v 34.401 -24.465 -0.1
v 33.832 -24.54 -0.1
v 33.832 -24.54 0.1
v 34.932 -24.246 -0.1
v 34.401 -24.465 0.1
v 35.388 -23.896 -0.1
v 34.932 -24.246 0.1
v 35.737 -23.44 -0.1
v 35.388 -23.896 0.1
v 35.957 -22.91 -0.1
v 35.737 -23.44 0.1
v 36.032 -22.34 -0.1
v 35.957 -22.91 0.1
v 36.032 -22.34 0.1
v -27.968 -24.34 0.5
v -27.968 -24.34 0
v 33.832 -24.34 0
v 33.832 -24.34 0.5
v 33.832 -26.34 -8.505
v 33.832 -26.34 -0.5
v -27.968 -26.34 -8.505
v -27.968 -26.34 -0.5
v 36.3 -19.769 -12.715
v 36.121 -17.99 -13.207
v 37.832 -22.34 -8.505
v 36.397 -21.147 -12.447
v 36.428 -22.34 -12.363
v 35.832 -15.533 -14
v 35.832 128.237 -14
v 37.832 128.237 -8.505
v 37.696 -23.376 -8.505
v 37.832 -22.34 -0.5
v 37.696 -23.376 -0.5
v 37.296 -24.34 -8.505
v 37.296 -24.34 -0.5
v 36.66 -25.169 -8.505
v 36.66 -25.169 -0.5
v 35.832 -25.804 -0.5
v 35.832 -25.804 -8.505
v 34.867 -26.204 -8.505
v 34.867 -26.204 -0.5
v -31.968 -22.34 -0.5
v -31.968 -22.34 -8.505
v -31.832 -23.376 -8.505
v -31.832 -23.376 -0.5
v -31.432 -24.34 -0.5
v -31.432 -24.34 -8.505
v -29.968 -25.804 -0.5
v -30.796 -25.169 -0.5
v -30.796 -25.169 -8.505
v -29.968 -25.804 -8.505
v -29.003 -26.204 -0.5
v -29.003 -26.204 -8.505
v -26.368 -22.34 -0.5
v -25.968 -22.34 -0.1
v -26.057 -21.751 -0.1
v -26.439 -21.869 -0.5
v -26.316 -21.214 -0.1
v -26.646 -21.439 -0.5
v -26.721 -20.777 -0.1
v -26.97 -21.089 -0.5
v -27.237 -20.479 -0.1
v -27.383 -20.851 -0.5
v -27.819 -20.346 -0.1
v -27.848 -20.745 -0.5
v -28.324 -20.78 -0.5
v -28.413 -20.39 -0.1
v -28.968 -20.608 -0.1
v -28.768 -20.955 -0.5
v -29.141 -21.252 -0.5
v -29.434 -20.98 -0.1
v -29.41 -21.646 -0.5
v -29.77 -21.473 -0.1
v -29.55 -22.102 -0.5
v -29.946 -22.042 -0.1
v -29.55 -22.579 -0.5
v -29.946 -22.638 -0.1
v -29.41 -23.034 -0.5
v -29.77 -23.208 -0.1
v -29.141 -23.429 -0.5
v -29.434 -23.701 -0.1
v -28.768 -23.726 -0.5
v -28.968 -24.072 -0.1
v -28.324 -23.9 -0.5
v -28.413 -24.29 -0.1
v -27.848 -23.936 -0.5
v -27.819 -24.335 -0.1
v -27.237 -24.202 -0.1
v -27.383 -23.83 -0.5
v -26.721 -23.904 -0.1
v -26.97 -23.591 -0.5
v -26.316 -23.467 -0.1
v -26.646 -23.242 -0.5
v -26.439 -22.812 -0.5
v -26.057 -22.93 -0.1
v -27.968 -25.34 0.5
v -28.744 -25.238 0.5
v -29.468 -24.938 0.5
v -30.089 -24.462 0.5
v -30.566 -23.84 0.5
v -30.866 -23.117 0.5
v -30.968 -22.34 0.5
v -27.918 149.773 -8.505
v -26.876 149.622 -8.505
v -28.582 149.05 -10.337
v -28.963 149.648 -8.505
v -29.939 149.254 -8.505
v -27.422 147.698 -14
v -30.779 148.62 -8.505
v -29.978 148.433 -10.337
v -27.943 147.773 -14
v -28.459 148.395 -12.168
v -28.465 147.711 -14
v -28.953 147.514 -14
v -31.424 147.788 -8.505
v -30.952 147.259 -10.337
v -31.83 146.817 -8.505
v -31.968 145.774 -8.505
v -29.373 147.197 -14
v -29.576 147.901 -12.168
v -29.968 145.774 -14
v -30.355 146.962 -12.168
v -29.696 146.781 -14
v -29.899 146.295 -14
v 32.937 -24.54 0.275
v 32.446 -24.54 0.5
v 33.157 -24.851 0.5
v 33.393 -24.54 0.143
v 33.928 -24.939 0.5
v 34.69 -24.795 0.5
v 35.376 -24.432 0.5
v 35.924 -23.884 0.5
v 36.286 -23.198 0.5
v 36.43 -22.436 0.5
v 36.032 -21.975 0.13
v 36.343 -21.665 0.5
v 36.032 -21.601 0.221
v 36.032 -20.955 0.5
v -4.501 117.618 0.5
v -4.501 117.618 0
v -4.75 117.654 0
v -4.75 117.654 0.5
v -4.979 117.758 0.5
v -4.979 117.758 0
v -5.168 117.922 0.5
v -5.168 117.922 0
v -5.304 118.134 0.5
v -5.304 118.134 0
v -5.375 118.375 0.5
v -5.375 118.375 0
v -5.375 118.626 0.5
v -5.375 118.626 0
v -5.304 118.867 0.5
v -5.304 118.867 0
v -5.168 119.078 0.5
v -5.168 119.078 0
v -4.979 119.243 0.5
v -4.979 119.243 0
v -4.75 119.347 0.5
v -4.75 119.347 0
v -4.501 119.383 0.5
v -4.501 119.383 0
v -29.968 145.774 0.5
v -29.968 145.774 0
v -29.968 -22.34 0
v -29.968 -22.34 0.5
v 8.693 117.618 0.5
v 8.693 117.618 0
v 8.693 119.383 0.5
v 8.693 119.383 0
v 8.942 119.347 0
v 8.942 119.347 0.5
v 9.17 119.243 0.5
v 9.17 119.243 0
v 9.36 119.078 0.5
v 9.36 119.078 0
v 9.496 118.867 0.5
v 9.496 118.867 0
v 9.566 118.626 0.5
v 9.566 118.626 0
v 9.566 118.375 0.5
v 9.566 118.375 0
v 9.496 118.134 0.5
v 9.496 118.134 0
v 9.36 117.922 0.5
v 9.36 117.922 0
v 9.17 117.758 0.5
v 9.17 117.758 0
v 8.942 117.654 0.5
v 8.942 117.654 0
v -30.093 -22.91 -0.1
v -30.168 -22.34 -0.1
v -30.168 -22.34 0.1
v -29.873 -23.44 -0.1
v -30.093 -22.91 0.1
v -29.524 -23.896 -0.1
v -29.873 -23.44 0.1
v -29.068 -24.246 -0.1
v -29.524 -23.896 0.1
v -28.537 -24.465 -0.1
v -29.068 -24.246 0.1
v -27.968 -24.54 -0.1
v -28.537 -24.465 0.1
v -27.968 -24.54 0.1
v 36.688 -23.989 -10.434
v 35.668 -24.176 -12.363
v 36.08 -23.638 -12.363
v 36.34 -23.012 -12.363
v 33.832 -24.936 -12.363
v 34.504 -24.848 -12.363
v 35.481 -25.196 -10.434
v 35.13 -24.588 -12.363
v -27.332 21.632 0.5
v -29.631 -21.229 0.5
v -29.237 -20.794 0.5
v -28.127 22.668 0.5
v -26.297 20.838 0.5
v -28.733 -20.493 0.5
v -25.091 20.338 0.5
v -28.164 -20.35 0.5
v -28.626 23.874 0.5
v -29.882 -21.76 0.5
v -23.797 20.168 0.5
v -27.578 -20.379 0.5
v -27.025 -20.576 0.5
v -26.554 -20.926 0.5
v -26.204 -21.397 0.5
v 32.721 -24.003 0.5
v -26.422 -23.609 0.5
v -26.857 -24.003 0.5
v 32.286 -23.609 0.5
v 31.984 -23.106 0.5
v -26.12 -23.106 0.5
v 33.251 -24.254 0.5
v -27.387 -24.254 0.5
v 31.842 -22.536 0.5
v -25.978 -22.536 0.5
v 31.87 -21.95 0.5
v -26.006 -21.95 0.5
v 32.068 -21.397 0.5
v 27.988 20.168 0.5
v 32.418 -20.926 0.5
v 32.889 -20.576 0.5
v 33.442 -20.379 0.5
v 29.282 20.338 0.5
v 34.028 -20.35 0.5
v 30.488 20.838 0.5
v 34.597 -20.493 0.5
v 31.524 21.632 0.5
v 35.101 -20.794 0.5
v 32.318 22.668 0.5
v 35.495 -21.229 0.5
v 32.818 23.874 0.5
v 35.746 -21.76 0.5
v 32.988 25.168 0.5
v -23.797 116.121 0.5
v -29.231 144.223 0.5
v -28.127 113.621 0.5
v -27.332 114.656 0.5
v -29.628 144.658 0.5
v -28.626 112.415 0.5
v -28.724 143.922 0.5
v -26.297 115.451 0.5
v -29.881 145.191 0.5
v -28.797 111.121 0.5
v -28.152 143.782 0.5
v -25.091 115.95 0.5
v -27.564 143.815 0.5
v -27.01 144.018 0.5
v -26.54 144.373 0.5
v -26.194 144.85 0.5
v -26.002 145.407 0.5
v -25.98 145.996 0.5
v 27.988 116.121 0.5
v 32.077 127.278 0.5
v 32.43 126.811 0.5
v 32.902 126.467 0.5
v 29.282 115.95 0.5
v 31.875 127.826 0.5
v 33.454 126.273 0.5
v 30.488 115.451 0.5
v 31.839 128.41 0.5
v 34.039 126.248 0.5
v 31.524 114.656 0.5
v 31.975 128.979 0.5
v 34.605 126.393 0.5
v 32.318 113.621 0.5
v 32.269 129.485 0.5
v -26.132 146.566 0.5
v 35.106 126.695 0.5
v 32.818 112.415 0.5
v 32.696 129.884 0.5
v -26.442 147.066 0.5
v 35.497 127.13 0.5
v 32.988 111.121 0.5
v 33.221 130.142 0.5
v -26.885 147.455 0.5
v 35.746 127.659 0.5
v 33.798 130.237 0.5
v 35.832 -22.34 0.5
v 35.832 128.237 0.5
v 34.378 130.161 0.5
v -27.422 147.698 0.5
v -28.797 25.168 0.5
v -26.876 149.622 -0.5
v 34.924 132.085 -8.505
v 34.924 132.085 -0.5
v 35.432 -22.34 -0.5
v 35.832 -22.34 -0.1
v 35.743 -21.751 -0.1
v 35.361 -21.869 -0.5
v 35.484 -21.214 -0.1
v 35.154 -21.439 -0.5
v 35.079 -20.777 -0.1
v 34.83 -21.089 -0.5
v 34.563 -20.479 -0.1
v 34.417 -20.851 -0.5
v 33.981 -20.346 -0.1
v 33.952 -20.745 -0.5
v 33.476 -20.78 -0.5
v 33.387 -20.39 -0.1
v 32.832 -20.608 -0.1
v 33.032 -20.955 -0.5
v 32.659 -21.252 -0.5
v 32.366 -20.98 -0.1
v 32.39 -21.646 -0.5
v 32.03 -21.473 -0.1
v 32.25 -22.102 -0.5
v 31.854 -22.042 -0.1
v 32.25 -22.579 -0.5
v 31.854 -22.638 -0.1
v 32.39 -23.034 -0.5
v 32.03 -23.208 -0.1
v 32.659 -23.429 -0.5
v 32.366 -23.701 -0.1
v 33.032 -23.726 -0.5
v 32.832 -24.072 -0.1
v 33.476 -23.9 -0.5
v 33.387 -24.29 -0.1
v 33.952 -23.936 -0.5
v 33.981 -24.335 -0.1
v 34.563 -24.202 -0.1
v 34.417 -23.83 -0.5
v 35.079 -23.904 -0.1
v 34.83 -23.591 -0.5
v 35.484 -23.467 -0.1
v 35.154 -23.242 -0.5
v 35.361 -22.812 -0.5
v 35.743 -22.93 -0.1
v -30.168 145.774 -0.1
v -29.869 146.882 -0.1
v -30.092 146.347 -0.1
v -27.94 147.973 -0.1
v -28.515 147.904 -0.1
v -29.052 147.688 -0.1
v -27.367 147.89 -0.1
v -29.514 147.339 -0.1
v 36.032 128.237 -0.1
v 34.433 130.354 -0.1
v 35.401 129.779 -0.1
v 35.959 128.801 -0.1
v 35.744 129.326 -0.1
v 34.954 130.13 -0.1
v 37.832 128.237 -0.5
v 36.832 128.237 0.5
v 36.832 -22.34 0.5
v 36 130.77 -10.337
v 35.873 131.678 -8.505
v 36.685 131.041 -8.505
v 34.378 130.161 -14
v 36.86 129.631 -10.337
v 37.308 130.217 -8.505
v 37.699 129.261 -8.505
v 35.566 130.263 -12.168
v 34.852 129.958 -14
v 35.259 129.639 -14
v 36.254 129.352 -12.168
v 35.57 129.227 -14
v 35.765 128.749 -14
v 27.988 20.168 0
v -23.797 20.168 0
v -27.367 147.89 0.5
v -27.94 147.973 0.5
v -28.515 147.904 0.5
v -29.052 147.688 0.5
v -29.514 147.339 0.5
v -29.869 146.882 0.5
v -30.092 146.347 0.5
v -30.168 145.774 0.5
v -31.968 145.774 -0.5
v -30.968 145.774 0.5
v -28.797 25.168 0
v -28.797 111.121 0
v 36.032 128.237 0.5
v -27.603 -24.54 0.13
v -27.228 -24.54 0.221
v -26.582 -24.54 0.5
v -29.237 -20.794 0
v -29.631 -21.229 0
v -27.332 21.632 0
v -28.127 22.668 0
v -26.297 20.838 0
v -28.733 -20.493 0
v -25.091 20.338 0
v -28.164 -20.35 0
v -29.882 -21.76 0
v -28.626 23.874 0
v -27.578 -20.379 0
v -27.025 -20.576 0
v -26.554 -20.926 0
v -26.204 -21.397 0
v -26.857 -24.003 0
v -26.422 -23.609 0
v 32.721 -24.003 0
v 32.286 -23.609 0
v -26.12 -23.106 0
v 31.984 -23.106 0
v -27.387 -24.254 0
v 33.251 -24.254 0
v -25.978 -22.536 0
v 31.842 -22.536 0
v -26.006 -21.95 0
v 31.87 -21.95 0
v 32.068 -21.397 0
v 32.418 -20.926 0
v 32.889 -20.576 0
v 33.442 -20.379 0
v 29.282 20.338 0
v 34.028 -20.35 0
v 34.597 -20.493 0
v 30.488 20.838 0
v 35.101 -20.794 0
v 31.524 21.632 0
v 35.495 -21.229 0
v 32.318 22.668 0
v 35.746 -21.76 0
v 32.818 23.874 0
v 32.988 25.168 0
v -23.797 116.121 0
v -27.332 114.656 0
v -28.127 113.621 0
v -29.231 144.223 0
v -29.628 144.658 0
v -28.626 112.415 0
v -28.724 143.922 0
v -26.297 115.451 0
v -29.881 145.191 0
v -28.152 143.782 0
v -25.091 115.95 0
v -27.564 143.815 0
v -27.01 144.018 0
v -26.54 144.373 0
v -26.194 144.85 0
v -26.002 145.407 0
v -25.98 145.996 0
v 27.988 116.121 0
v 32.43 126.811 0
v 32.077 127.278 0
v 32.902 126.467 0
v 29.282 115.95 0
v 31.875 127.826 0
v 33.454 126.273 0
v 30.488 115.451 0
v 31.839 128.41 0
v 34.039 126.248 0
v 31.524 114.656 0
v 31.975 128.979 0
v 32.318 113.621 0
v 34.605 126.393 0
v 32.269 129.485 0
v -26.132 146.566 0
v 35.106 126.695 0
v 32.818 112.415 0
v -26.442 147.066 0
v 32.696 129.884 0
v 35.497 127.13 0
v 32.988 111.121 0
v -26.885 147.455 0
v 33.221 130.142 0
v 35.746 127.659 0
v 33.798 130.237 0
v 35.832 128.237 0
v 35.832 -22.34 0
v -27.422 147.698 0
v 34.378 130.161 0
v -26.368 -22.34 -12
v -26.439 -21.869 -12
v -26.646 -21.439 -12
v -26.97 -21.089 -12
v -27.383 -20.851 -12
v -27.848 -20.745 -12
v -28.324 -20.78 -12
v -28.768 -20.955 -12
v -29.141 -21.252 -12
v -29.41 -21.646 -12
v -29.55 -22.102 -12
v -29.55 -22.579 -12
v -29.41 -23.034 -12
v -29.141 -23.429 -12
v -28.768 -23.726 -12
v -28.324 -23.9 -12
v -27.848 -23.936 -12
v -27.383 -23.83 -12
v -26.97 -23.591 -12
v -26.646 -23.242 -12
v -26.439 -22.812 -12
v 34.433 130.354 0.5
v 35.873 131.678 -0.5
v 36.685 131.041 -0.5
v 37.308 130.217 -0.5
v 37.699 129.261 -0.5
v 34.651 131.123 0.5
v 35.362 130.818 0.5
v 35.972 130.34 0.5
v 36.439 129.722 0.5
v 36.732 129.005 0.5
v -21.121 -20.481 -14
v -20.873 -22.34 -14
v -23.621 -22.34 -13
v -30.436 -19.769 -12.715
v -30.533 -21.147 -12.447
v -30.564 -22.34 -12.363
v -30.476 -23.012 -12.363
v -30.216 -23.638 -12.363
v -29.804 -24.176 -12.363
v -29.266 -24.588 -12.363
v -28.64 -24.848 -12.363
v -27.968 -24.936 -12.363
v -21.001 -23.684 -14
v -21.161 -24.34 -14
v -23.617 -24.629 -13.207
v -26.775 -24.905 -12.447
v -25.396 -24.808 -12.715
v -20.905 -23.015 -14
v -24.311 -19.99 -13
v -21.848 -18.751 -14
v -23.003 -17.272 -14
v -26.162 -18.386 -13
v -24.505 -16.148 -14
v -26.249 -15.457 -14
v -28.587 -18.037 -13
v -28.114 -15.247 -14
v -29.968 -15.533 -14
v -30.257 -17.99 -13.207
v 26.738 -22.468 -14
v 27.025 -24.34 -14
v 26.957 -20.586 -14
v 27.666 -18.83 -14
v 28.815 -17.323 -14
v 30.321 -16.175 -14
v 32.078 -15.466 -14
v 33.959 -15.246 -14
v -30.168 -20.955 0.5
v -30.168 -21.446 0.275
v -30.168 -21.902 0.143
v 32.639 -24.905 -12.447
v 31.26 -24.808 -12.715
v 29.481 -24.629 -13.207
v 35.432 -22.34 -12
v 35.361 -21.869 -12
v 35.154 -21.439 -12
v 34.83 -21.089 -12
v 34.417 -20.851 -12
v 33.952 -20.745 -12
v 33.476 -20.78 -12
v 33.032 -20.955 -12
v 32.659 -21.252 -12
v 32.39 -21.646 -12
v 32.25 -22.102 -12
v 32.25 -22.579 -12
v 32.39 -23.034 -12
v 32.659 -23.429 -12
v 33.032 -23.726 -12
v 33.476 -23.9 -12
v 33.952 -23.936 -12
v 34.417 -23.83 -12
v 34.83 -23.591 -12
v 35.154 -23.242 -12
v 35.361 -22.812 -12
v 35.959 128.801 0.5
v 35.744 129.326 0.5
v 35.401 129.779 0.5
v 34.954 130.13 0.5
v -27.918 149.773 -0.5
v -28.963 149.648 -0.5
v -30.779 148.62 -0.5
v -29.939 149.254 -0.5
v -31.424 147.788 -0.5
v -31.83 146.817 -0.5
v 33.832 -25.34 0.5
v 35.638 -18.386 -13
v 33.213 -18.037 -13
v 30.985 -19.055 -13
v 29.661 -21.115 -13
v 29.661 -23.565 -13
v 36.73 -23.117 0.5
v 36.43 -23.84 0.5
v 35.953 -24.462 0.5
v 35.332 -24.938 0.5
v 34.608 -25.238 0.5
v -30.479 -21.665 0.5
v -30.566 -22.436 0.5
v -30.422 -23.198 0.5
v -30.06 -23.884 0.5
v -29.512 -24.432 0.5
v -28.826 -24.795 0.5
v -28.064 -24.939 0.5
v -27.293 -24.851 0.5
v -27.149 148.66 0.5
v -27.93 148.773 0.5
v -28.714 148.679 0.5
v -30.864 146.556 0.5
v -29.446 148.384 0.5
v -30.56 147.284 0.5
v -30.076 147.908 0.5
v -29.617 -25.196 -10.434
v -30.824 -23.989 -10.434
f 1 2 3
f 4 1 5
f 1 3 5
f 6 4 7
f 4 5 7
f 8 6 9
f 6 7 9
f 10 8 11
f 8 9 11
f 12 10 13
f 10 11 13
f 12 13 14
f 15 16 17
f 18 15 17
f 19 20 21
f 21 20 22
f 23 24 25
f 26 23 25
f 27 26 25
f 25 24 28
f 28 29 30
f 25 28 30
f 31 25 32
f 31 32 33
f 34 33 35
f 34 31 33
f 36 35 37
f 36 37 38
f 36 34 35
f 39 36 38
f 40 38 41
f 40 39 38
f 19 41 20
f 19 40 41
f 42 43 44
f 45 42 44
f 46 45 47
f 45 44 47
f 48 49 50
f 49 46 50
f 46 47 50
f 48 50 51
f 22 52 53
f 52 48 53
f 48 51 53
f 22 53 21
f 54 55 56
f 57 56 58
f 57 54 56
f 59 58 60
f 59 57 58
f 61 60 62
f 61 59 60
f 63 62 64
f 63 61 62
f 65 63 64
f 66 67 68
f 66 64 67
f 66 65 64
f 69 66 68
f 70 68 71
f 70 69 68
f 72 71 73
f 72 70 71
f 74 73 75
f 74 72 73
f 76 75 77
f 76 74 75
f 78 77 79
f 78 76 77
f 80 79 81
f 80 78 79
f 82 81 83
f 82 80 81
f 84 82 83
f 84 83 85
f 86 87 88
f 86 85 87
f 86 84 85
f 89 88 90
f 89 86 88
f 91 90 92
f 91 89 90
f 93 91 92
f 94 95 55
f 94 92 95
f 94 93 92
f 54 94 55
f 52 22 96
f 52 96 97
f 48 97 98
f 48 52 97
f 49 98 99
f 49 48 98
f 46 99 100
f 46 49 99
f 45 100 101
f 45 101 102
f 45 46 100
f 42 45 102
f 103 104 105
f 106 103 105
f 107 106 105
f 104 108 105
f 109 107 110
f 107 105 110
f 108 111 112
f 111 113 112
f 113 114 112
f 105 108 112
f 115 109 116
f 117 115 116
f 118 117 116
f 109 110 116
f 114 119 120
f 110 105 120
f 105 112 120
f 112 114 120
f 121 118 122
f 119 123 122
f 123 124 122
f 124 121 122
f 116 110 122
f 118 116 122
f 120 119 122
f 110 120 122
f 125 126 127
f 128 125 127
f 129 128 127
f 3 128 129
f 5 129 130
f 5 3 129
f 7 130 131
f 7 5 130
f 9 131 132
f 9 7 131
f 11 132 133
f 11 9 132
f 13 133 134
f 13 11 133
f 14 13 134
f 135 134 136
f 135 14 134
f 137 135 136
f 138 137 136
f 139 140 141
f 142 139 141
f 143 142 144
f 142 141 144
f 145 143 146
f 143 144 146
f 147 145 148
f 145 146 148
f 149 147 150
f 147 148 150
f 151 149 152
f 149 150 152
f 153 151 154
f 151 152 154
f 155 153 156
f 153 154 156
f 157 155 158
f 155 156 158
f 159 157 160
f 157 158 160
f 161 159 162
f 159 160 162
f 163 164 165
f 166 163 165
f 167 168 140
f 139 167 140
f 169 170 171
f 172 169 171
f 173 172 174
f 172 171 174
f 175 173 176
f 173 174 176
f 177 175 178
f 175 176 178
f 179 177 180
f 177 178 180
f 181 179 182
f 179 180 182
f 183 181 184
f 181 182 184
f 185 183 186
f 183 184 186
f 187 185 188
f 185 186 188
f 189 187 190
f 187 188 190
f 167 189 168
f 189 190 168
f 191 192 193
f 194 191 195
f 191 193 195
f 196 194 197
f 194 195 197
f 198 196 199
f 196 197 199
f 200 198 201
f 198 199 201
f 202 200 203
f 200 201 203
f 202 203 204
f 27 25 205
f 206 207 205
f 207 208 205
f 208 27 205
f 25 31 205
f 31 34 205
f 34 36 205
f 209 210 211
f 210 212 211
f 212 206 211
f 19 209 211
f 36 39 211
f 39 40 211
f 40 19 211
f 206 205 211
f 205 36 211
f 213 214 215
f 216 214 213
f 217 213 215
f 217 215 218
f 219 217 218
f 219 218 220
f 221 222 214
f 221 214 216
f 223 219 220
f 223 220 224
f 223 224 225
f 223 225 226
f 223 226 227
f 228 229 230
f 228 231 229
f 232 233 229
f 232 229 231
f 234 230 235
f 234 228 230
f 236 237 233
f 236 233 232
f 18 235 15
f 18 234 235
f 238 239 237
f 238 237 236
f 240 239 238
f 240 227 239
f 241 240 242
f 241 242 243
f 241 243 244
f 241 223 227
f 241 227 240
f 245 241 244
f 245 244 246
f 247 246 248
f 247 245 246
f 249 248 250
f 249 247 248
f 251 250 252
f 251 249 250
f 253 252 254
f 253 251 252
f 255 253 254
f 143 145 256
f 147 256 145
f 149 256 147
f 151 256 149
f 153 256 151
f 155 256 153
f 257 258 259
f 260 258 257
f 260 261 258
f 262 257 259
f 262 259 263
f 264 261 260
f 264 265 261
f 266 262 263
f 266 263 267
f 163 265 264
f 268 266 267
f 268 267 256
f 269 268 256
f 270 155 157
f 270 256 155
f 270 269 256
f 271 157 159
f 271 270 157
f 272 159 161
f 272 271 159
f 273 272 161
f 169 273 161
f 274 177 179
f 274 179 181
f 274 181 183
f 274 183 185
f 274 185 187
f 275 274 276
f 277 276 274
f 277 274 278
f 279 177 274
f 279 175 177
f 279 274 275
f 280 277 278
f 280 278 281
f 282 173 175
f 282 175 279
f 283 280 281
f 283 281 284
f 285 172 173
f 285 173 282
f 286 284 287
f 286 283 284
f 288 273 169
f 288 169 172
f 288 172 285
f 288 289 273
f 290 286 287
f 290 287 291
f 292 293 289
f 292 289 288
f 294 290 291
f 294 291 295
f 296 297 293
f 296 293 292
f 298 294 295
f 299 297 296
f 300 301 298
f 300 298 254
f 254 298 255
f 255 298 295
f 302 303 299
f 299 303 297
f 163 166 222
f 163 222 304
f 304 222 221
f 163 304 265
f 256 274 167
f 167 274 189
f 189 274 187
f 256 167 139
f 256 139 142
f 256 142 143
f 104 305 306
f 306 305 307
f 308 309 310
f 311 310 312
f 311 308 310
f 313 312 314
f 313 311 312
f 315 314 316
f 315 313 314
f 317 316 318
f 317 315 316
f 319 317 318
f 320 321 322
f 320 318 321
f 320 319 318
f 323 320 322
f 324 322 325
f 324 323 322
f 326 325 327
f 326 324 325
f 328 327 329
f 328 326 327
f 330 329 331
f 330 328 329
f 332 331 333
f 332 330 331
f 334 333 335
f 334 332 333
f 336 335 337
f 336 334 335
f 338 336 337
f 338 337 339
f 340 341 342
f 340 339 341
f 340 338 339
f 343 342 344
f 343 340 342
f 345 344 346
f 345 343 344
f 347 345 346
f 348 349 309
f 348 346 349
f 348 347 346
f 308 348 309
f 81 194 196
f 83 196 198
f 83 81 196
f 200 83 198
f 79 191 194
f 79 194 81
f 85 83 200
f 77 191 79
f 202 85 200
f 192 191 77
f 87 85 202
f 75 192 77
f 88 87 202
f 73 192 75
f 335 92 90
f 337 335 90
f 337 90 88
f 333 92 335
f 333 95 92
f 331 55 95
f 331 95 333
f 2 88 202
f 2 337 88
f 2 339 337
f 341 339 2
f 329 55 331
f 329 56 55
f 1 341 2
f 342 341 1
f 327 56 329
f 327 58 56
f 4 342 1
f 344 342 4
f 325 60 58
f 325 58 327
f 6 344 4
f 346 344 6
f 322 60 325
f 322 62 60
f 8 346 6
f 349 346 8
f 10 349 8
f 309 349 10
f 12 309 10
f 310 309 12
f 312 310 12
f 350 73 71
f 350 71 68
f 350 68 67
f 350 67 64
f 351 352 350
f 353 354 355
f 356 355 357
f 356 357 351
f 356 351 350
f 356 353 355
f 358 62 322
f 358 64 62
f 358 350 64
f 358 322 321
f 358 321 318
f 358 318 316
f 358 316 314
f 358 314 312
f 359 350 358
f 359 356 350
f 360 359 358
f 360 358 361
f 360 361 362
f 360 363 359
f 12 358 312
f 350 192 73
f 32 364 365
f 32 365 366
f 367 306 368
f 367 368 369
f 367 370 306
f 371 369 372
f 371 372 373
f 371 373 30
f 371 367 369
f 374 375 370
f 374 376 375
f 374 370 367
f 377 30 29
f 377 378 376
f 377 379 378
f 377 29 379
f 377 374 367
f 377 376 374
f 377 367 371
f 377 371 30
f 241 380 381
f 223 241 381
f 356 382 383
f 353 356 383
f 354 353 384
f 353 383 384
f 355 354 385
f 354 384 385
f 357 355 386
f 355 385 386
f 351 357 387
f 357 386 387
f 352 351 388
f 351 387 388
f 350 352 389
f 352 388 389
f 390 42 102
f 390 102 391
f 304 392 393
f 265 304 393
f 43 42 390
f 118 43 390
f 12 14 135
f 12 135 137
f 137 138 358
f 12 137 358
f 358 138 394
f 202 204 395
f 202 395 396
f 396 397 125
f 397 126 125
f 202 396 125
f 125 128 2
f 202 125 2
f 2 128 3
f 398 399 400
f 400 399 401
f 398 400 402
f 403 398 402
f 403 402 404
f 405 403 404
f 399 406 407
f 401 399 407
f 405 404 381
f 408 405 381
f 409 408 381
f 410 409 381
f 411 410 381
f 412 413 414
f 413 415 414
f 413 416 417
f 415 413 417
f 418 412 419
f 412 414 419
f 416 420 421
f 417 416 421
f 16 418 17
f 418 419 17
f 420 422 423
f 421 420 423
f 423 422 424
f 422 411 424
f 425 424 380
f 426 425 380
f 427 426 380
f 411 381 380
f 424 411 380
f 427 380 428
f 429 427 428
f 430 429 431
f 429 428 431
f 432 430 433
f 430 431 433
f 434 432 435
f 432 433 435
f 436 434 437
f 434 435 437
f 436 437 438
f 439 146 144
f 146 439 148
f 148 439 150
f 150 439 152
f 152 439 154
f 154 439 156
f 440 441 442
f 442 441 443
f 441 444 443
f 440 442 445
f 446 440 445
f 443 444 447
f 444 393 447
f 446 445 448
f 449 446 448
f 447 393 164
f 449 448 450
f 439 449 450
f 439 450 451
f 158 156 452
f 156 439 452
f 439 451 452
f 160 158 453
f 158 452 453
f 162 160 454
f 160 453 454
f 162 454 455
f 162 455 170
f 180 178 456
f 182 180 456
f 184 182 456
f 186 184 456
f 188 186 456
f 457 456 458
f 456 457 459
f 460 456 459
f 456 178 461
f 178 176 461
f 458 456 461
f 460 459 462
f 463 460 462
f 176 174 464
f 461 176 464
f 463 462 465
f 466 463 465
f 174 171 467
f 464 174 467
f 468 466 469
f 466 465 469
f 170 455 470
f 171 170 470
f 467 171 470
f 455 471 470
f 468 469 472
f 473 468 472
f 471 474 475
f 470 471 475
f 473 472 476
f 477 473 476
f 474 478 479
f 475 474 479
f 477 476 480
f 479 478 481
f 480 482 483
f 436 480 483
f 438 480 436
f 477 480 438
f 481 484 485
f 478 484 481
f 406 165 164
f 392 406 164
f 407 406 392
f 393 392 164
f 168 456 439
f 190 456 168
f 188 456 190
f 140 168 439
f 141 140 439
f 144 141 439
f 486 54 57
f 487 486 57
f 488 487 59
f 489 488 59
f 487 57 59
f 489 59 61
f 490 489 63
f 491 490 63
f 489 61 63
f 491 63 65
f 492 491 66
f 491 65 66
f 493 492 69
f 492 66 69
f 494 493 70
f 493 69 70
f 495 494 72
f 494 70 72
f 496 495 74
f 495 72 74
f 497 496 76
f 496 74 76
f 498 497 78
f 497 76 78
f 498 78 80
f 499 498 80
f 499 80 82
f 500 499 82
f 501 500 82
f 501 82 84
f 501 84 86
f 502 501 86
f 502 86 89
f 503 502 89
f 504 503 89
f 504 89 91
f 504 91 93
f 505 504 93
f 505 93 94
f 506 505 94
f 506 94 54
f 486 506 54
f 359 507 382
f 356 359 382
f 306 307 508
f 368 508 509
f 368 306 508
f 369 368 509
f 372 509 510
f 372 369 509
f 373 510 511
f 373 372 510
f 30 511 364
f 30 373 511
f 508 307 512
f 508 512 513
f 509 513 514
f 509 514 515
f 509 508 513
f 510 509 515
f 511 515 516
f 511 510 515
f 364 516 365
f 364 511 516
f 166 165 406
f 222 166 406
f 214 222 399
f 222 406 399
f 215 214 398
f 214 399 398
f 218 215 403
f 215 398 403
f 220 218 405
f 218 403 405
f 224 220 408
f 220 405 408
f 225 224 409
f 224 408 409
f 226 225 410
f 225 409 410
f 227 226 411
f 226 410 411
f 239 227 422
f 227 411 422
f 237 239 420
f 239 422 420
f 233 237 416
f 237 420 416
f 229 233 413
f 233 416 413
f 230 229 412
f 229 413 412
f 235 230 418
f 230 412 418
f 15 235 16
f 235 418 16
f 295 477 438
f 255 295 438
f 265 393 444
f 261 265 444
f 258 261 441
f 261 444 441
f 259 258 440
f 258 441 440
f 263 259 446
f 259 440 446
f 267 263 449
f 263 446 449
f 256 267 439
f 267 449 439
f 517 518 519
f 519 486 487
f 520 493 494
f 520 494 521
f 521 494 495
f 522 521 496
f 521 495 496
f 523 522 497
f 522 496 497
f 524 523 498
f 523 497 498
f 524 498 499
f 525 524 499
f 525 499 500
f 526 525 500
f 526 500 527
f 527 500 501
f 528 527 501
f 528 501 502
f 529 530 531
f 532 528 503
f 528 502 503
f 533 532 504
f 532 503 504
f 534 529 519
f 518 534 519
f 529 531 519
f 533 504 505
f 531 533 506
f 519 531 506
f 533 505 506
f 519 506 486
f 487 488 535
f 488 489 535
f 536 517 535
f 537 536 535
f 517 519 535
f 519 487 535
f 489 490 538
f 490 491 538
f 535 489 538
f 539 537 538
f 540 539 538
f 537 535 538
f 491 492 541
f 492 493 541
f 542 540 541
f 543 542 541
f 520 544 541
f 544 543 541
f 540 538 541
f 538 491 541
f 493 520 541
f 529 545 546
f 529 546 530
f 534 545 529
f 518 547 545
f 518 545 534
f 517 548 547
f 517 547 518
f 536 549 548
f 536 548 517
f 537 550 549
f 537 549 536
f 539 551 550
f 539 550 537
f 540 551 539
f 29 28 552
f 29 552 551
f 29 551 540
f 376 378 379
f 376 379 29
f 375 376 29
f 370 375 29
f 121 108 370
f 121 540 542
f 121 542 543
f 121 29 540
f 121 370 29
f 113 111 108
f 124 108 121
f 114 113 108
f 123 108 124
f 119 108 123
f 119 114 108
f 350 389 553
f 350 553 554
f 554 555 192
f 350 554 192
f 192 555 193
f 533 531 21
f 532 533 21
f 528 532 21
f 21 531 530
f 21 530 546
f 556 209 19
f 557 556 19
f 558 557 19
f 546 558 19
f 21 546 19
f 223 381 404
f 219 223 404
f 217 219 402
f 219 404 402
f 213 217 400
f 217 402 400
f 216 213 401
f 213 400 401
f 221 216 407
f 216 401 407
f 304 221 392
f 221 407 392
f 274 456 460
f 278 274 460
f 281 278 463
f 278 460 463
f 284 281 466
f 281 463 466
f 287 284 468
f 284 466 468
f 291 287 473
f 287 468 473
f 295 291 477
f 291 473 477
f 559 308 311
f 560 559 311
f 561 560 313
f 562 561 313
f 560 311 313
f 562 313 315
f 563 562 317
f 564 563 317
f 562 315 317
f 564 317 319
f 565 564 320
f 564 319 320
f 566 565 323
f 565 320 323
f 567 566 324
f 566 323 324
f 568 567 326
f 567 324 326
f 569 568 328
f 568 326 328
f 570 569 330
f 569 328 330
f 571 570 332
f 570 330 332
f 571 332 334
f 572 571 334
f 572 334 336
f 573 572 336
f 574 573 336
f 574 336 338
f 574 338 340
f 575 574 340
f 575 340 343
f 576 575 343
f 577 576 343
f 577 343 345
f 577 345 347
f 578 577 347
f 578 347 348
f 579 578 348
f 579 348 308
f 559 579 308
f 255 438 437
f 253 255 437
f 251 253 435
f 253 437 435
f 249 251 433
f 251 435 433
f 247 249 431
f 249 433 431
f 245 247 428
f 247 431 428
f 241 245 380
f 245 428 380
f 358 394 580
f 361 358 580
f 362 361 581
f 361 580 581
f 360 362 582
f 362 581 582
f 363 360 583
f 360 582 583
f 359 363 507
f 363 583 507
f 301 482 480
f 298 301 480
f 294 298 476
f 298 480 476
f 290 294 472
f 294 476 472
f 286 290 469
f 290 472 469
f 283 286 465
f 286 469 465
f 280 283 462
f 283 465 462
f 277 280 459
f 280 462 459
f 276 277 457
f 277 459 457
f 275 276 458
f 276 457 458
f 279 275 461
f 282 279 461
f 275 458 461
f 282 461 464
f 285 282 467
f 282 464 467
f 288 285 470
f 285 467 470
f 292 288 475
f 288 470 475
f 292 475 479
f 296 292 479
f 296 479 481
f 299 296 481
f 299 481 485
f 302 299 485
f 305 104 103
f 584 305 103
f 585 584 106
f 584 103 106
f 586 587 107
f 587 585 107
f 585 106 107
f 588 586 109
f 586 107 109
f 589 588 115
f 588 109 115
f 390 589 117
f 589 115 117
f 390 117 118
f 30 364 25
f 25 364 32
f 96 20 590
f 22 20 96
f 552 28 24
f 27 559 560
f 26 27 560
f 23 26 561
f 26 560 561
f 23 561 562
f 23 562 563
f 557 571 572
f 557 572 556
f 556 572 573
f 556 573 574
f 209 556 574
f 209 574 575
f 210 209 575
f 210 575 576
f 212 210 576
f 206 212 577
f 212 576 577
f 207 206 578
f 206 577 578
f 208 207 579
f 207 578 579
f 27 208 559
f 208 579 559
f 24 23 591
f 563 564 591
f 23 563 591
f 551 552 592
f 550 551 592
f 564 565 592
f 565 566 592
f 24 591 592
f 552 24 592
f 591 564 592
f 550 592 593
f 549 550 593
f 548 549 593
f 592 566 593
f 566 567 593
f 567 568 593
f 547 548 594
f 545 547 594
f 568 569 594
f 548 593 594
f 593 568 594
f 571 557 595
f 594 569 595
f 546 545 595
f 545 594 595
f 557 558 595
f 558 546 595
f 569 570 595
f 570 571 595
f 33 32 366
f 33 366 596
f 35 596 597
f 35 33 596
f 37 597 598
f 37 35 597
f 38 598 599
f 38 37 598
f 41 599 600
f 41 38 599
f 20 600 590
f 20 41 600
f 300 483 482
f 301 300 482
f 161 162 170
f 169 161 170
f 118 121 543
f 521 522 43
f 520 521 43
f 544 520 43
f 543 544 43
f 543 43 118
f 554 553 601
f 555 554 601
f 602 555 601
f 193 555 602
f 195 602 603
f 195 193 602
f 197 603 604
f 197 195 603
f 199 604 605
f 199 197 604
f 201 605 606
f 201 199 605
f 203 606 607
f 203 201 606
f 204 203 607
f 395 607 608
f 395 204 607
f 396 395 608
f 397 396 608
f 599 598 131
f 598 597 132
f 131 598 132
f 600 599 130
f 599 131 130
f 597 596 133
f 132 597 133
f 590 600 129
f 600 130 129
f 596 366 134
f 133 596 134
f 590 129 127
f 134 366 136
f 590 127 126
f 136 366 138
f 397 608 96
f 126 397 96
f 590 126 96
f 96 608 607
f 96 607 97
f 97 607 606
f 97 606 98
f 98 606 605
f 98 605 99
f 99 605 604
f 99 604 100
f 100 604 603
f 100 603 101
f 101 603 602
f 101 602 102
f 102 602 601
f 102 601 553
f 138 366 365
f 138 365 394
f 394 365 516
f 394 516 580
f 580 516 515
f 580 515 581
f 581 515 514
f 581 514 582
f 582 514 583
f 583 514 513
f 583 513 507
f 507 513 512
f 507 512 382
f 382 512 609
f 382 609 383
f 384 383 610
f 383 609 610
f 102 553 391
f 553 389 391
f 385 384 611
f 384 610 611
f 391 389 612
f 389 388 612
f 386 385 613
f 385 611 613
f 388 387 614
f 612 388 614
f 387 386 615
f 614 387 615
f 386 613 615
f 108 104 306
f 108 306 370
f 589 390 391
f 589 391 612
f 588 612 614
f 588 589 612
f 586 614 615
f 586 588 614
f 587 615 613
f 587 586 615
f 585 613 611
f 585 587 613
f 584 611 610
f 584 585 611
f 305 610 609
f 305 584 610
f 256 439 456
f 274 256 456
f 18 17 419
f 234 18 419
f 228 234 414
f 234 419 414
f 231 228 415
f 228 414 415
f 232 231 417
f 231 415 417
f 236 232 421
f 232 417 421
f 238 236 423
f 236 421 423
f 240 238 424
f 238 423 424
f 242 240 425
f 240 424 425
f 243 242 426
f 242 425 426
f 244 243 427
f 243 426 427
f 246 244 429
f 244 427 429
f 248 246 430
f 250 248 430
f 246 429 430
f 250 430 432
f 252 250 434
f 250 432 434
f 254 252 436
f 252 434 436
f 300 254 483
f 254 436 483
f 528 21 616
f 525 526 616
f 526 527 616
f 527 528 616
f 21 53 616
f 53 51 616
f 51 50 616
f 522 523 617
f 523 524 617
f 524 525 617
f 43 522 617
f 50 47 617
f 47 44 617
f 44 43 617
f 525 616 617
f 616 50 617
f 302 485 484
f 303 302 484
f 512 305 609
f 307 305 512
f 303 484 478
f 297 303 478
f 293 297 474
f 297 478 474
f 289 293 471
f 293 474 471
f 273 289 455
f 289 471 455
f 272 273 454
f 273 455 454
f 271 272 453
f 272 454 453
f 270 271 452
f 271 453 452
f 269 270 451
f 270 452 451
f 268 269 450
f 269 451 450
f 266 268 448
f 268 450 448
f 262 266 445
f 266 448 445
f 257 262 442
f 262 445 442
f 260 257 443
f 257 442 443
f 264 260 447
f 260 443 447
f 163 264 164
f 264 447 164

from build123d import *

# Parameters (mm, degrees)
BOSS_EXTRUDE1_START = 0.5
SKETCH1_R           = 1.6
BOSS_EXTRUDE1_DEPTH = 14.5
FILLET1_R           = 4
CHAMFER1_SIZE       = 5.494954839
CHAMFER1_SIZE_2     = 2
CHAMFER2_SIZE       = 1
BOSS_EXTRUDE2_START = -0.5
BOSS_EXTRUDE2_DEPTH = 0.5
CUT_EXTRUDE2_DEPTH  = 0.6


with BuildPart() as part:
    # Sketch1 → Boss-Extrude1 (new body)
    with BuildSketch(Plane.XY.offset(BOSS_EXTRUDE1_START)):
        Polygon((-31.968025007, 151.066521257), (37.831974993, 131.260245954), (37.831974993, -26.340271098), (-31.968025007, -26.340271098), align=None)
        with Locations((-27.968025007, -22.340271098)):
            Circle(SKETCH1_R, mode=Mode.SUBTRACT)
        with Locations((33.831974993, -22.340271098)):
            Circle(SKETCH1_R, mode=Mode.SUBTRACT)
    extrude(amount=-BOSS_EXTRUDE1_DEPTH)

    # Fillet1
    fillet1_edges = [part.edges().sort_by_distance(p)[0] for p in [
        (-31.968025007, 151.066521257, -6.75),
        (37.831974993, 131.260245954, -6.75),
        (37.831974993, -26.340271098, -6.75),
        (-31.968025007, -26.340271098, -6.75),
    ]]
    fillet(fillet1_edges, radius=FILLET1_R)

    # Chamfer1
    # the kernel refuses this chamfer: 5.494954839, 2 mm, written as the material it takes off along each edge
    with BuildSketch(Plane(origin=(-27.968025007, -22.340271098, -14), x_dir=(1, 0, 0), z_dir=(0, -1, 0))) as chamfer1_piece_1:
        Polygon((1.6 + CHAMFER1_SIZE, 0), (1.6, CHAMFER1_SIZE_2), (1.6, 0), align=None)
    revolve(axis=Axis((-27.968025007, -22.340271098, -14), (0, 0, 1)), mode=Mode.SUBTRACT)
    with BuildSketch(Plane(origin=(33.831974993, -22.340271098, -14), x_dir=(1, 0, 0), z_dir=(0, -1, 0))) as chamfer1_piece_2:
        Polygon((1.6 + CHAMFER1_SIZE, 0), (1.6, CHAMFER1_SIZE_2), (1.6, 0), align=None)
    revolve(axis=Axis((33.831974993, -22.340271098, -14), (0, 0, 1)), mode=Mode.SUBTRACT)
    with BuildSketch(Plane(origin=(37.831974993, 128.237356706, -14), x_dir=(-0.9950833631817486, 0, -0.09904090225205021), z_dir=(0, -1, 0))) as chamfer1_piece_3:
        Polygon((CHAMFER1_SIZE_2 * 0.995083363182, -CHAMFER1_SIZE_2 * 0.0990409022521), (-CHAMFER1_SIZE * 0.0990409022504, -CHAMFER1_SIZE * 0.995083363165), (0, 0), align=None)
    extrude(amount=150.577627804, mode=Mode.SUBTRACT)
    with BuildSketch(Plane(origin=(-26.876103777, 149.621650287, -14), x_dir=(0.0035989882615877116, 0.012683322674999943, 0.9999130865277316), z_dir=(0.9620196212654089, -0.2729803075321726, 0))) as chamfer1_piece_4:
        Polygon((CHAMFER1_SIZE * 0.999913086511, CHAMFER1_SIZE * 0.0131840581984), (-CHAMFER1_SIZE_2 * 0.0131840581986, CHAMFER1_SIZE_2 * 0.999913086528), (0, 0), align=None)
    extrude(amount=64.239853984, mode=Mode.SUBTRACT)
    with BuildSketch(Plane(origin=(-31.968025007, -22.340271098, -14), x_dir=(0.9950833631817486, 0, -0.0990409022520504), z_dir=(0, 1, 0))) as chamfer1_piece_5:
        Polygon((CHAMFER1_SIZE_2 * 0.995083363182, -CHAMFER1_SIZE_2 * 0.0990409022521), (-CHAMFER1_SIZE * 0.0990409022504, -CHAMFER1_SIZE * 0.995083363165), (0, 0), align=None)
    extrude(amount=168.1138429, mode=Mode.SUBTRACT)
    with BuildSketch(Plane(origin=(33.831974993, -26.340271098, -14), x_dir=(0, 0.9950833631817486, -0.09904090225205021), z_dir=(-1, 0, 0))) as chamfer1_piece_6:
        Polygon((CHAMFER1_SIZE_2 * 0.995083363182, -CHAMFER1_SIZE_2 * 0.0990409022521), (-CHAMFER1_SIZE * 0.0990409022504, -CHAMFER1_SIZE * 0.995083363165), (0, 0), align=None)
    extrude(amount=61.8, mode=Mode.SUBTRACT)
    with BuildSketch(Plane(origin=(-27.968025007, 145.773571802, -14), x_dir=(0.2729803075321709, 0.9620196212654092, 0), z_dir=(0.9620196212654092, -0.2729803075321709, 0))) as chamfer1_piece_7:
        Polygon((4, CHAMFER1_SIZE), (4 - CHAMFER1_SIZE_2, 0), (4, 0), align=None)
    revolve(axis=Axis((-27.968025007, 145.773571802, -14), (0, 0, 1)), revolution_arc=105.841689768, mode=Mode.SUBTRACT)
    with BuildSketch(Plane(origin=(-27.968025007, -22.340271098, -14), x_dir=(0, -1, 0), z_dir=(1, 0, 0))) as chamfer1_piece_8:
        Polygon((4 - CHAMFER1_SIZE_2, 0), (4, -CHAMFER1_SIZE), (4, 0), align=None)
    revolve(axis=Axis((-27.968025007, -22.340271098, -14), (0, 0, -1)), revolution_arc=90, mode=Mode.SUBTRACT)
    with BuildSketch(Plane(origin=(33.831974993, -22.340271098, -14), x_dir=(1, 0, 0), z_dir=(0, 1, 0))) as chamfer1_piece_9:
        Polygon((4 - CHAMFER1_SIZE_2, 0), (4, -CHAMFER1_SIZE), (4, 0), align=None)
    revolve(axis=Axis((33.831974993, -22.340271098, -14), (0, 0, -1)), revolution_arc=90, mode=Mode.SUBTRACT)
    with BuildSketch(Plane(origin=(33.831974993, 128.237356706, -14), x_dir=(0.27298030753217006, 0.9620196212654094, 0), z_dir=(-0.9620196212654094, 0.27298030753217006, 0))) as chamfer1_piece_10:
        Polygon((4, -CHAMFER1_SIZE), (4 - CHAMFER1_SIZE_2, 0), (4, 0), align=None)
    revolve(axis=Axis((33.831974993, 128.237356706, -14), (0, 0, -1)), revolution_arc=74.158310232, mode=Mode.SUBTRACT)

    # Chamfer2
    chamfer2_edges = [part.edges().sort_by_distance(p)[0] for p in [
        (-29.568025007, -22.340271098, 0.5),
        (32.231974993, -22.340271098, 0.5),
        (37.831974993, 52.948542804, 0.5),
        (-31.968025007, 61.716650352, 0.5),
        (2.931974993, -26.340271098, 0.5),
        (4.023896223, 140.853542739, 0.5),
        (-30.379696116, 148.964785123, 0.5),
        (-30.796452132, -25.168698223, 0.5),
        (36.660402118, -25.168698223, 0.5),
        (37.023188314, 130.649027815, 0.5),
    ]]
    chamfer(chamfer2_edges, length=CHAMFER2_SIZE)

    # Sketch3 → Cut-Extrude2 (cut)
    with BuildSketch(Plane.XY.offset(0.5)):
        with BuildLine():
            Line((-27.968025007, -24.540271098), (33.831974993, -24.540271098))
            ThreePointArc((33.831974993, -24.540271098), (35.387609912, -23.895906017), (36.031974993, -22.340271098))
            Line((36.031974993, -22.340271098), (36.031974993, 128.237356706))
            ThreePointArc((36.031974993, 128.237356706), (35.58714232, 129.563775816), (34.43253167, 130.353799873))
            Line((34.43253167, 130.353799873), (-27.36746833, 147.890014969))
            ThreePointArc((-27.36746833, 147.890014969), (-29.294444117, 147.528739129), (-30.168025007, 145.773571802))
            Line((-30.168025007, 145.773571802), (-30.168025007, -22.340271098))
            ThreePointArc((-30.168025007, -22.340271098), (-29.523659926, -23.895906017), (-27.968025007, -24.540271098))
        make_face()
    extrude(amount=-CUT_EXTRUDE2_DEPTH, mode=Mode.SUBTRACT)


with BuildPart() as body_2:
    # Sketch2 → Boss-Extrude2 (new body)
    with BuildSketch(Plane.XY.offset(0.5).offset(BOSS_EXTRUDE2_START)):
        with BuildLine():
            Line((-27.968025007, -24.340271098), (33.831974993, -24.340271098))
            ThreePointArc((33.831974993, -24.340271098), (32.417761431, -20.926057536), (35.831974993, -22.340271098))
            Line((35.831974993, -22.340271098), (35.831974993, 128.237356706))
            ThreePointArc((35.831974993, 128.237356706), (32.236368332, 127.031521151), (34.377935608, 130.161395948))
            Line((34.377935608, 130.161395948), (-27.422064392, 147.697611045))
            ThreePointArc((-27.422064392, 147.697611045), (-26.762189452, 144.177965142), (-29.968025007, 145.773571802))
            Line((-29.968025007, 145.773571802), (-29.968025007, -22.340271098))
            ThreePointArc((-29.968025007, -22.340271098), (-26.553811445, -20.926057536), (-27.968025007, -24.340271098))
        make_face()
        with BuildLine():
            Line((-23.796575469, 116.120626103), (27.988084902, 116.120626103))
            ThreePointArc((27.988084902, 116.120626103), (31.523618808, 114.656160009), (32.988084902, 111.120626103))
            Line((32.988084902, 111.120626103), (32.988084902, 25.167778842))
            ThreePointArc((32.988084902, 25.167778842), (31.523618808, 21.632244936), (27.988084902, 20.167778842))
            Line((27.988084902, 20.167778842), (-23.796575469, 20.167778842))
            ThreePointArc((-23.796575469, 20.167778842), (-27.332109375, 21.632244936), (-28.796575469, 25.167778842))
            Line((-28.796575469, 25.167778842), (-28.796575469, 111.120626103))
            ThreePointArc((-28.796575469, 111.120626103), (-27.332109375, 114.656160009), (-23.796575469, 116.120626103))
        make_face(mode=Mode.SUBTRACT)
        with BuildLine():
            Line((-4.501435932, 119.382737334), (8.692945365, 119.382737334))
            ThreePointArc((8.692945365, 119.382737334), (9.575424971, 118.500257728), (8.692945365, 117.617778122))
            Line((8.692945365, 117.617778122), (-4.501435932, 117.617778122))
            ThreePointArc((-4.501435932, 117.617778122), (-5.383915538, 118.500257728), (-4.501435932, 119.382737334))
        make_face(mode=Mode.SUBTRACT)
    extrude(amount=BOSS_EXTRUDE2_DEPTH)


solid = Compound([part.part, body_2.part])
